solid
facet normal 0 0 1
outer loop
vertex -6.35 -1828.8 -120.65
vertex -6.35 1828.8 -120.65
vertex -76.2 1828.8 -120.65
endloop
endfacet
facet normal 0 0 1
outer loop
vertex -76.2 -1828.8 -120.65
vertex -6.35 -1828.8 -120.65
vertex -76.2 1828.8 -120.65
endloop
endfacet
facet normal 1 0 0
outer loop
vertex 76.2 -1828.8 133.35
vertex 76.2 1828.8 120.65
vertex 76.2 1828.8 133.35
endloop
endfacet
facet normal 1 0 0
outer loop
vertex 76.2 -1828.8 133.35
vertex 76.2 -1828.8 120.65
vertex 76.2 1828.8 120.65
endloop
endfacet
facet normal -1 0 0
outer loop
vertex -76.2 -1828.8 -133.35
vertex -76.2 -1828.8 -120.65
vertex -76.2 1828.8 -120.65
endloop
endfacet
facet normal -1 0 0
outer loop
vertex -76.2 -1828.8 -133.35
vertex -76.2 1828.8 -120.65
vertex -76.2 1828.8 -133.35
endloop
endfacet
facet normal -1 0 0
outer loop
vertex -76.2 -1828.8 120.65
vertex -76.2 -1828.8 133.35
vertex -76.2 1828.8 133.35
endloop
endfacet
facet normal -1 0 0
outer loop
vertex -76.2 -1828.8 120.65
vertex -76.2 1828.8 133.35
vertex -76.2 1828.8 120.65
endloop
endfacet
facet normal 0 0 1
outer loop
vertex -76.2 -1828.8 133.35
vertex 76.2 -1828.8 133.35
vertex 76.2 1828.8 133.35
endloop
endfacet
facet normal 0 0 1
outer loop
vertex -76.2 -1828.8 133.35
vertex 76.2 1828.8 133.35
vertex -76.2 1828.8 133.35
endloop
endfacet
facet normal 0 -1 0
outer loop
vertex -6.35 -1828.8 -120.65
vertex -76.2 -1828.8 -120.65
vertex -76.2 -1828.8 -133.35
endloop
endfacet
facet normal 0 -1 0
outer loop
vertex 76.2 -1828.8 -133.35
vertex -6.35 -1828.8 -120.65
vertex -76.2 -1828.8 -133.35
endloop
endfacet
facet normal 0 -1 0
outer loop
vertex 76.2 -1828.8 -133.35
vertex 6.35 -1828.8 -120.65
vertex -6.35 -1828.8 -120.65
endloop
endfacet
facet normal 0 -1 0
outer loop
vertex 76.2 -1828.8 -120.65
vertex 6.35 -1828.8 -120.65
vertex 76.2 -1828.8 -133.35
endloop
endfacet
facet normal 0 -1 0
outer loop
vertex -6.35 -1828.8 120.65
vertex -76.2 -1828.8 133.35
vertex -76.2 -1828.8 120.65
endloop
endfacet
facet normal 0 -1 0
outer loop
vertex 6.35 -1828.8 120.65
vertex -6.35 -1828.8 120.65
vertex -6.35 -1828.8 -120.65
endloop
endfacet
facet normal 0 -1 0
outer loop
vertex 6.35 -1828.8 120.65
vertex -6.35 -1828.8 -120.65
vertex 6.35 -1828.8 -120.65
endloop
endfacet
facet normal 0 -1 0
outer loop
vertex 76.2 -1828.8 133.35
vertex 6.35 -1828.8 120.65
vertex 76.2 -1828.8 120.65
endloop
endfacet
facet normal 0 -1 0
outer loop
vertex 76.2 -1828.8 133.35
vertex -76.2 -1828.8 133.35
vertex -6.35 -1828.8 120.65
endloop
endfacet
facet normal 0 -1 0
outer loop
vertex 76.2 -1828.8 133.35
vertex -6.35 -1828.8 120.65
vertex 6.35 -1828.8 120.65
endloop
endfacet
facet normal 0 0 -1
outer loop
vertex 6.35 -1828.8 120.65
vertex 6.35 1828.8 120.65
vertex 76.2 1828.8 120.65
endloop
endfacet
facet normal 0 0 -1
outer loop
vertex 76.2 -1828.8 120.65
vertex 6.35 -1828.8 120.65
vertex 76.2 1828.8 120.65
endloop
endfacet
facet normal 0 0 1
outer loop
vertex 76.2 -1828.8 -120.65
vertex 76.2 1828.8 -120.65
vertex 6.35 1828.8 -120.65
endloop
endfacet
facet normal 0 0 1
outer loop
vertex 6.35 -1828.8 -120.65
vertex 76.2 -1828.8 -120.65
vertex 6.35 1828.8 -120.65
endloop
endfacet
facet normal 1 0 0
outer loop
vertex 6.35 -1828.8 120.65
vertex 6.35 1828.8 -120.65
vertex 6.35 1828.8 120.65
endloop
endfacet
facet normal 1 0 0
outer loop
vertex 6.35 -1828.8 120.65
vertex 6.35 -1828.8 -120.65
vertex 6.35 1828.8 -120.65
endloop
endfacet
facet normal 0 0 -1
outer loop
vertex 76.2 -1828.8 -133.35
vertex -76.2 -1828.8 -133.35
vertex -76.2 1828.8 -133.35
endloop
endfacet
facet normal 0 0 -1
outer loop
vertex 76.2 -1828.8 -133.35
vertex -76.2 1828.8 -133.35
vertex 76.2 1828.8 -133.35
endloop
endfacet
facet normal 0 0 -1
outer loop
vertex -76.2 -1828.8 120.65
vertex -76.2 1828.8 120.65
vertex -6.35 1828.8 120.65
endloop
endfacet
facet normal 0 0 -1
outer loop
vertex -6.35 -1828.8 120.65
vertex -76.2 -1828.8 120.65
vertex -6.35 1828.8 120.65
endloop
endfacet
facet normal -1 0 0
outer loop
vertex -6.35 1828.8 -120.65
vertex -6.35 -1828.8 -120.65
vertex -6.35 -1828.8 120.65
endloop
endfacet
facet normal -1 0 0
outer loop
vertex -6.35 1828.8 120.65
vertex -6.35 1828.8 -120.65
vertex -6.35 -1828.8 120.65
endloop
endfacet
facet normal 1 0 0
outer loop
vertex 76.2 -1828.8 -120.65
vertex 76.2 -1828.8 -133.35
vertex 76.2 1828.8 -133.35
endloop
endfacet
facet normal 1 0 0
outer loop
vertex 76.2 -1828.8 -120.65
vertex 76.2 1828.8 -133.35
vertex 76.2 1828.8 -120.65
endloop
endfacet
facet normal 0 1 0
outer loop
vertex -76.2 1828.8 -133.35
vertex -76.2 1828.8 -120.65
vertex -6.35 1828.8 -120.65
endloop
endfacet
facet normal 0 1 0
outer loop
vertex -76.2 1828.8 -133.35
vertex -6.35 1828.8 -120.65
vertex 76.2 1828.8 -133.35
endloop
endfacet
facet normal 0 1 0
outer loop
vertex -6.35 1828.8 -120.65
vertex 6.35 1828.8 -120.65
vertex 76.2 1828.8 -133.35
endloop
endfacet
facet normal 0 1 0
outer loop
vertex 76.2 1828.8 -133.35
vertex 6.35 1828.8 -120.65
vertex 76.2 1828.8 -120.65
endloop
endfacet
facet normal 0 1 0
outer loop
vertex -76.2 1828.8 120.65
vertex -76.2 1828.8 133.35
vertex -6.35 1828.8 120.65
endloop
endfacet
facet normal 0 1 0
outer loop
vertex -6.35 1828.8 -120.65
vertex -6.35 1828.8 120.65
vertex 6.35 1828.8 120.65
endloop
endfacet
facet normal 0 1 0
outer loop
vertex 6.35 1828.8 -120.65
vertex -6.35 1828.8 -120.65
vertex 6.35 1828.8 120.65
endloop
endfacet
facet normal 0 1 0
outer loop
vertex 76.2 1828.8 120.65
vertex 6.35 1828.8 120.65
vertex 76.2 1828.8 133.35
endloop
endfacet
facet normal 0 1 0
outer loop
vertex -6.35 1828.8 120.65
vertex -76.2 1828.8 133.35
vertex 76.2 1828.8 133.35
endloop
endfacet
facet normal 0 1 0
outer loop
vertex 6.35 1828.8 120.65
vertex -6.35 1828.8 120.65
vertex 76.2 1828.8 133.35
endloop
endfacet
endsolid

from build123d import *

# Parameters (mm, degrees)
F0_W     = 12.7
F0_H     = 6.35
F0_H_2   = 241.3
F1_DEPTH = 1828.8


with BuildPart() as f1:
    # F0 (on Front) → F1 (new body, symmetric)
    with BuildSketch(Plane.XZ):
        with Locations((0, 123.825)):
            Rectangle(F0_W, F0_H)
        Polygon((-6.35, 127), (6.35, 127), (6.35, 120.65), (76.2, 120.65), (76.2, 133.35), (-76.2, 133.35), (-76.2, 120.65), (-6.35, 120.65), align=None)
        Rectangle(F0_W, F0_H_2)
        Polygon((76.2, -120.65), (6.35, -120.65), (6.35, -127), (-6.35, -127), (-6.35, -120.65), (-76.2, -120.65), (-76.2, -133.35), (76.2, -133.35), align=None)
        with Locations((0, -123.825)):
            Rectangle(F0_W, F0_H)
    extrude(amount=F1_DEPTH, both=True)


solid = f1.part
